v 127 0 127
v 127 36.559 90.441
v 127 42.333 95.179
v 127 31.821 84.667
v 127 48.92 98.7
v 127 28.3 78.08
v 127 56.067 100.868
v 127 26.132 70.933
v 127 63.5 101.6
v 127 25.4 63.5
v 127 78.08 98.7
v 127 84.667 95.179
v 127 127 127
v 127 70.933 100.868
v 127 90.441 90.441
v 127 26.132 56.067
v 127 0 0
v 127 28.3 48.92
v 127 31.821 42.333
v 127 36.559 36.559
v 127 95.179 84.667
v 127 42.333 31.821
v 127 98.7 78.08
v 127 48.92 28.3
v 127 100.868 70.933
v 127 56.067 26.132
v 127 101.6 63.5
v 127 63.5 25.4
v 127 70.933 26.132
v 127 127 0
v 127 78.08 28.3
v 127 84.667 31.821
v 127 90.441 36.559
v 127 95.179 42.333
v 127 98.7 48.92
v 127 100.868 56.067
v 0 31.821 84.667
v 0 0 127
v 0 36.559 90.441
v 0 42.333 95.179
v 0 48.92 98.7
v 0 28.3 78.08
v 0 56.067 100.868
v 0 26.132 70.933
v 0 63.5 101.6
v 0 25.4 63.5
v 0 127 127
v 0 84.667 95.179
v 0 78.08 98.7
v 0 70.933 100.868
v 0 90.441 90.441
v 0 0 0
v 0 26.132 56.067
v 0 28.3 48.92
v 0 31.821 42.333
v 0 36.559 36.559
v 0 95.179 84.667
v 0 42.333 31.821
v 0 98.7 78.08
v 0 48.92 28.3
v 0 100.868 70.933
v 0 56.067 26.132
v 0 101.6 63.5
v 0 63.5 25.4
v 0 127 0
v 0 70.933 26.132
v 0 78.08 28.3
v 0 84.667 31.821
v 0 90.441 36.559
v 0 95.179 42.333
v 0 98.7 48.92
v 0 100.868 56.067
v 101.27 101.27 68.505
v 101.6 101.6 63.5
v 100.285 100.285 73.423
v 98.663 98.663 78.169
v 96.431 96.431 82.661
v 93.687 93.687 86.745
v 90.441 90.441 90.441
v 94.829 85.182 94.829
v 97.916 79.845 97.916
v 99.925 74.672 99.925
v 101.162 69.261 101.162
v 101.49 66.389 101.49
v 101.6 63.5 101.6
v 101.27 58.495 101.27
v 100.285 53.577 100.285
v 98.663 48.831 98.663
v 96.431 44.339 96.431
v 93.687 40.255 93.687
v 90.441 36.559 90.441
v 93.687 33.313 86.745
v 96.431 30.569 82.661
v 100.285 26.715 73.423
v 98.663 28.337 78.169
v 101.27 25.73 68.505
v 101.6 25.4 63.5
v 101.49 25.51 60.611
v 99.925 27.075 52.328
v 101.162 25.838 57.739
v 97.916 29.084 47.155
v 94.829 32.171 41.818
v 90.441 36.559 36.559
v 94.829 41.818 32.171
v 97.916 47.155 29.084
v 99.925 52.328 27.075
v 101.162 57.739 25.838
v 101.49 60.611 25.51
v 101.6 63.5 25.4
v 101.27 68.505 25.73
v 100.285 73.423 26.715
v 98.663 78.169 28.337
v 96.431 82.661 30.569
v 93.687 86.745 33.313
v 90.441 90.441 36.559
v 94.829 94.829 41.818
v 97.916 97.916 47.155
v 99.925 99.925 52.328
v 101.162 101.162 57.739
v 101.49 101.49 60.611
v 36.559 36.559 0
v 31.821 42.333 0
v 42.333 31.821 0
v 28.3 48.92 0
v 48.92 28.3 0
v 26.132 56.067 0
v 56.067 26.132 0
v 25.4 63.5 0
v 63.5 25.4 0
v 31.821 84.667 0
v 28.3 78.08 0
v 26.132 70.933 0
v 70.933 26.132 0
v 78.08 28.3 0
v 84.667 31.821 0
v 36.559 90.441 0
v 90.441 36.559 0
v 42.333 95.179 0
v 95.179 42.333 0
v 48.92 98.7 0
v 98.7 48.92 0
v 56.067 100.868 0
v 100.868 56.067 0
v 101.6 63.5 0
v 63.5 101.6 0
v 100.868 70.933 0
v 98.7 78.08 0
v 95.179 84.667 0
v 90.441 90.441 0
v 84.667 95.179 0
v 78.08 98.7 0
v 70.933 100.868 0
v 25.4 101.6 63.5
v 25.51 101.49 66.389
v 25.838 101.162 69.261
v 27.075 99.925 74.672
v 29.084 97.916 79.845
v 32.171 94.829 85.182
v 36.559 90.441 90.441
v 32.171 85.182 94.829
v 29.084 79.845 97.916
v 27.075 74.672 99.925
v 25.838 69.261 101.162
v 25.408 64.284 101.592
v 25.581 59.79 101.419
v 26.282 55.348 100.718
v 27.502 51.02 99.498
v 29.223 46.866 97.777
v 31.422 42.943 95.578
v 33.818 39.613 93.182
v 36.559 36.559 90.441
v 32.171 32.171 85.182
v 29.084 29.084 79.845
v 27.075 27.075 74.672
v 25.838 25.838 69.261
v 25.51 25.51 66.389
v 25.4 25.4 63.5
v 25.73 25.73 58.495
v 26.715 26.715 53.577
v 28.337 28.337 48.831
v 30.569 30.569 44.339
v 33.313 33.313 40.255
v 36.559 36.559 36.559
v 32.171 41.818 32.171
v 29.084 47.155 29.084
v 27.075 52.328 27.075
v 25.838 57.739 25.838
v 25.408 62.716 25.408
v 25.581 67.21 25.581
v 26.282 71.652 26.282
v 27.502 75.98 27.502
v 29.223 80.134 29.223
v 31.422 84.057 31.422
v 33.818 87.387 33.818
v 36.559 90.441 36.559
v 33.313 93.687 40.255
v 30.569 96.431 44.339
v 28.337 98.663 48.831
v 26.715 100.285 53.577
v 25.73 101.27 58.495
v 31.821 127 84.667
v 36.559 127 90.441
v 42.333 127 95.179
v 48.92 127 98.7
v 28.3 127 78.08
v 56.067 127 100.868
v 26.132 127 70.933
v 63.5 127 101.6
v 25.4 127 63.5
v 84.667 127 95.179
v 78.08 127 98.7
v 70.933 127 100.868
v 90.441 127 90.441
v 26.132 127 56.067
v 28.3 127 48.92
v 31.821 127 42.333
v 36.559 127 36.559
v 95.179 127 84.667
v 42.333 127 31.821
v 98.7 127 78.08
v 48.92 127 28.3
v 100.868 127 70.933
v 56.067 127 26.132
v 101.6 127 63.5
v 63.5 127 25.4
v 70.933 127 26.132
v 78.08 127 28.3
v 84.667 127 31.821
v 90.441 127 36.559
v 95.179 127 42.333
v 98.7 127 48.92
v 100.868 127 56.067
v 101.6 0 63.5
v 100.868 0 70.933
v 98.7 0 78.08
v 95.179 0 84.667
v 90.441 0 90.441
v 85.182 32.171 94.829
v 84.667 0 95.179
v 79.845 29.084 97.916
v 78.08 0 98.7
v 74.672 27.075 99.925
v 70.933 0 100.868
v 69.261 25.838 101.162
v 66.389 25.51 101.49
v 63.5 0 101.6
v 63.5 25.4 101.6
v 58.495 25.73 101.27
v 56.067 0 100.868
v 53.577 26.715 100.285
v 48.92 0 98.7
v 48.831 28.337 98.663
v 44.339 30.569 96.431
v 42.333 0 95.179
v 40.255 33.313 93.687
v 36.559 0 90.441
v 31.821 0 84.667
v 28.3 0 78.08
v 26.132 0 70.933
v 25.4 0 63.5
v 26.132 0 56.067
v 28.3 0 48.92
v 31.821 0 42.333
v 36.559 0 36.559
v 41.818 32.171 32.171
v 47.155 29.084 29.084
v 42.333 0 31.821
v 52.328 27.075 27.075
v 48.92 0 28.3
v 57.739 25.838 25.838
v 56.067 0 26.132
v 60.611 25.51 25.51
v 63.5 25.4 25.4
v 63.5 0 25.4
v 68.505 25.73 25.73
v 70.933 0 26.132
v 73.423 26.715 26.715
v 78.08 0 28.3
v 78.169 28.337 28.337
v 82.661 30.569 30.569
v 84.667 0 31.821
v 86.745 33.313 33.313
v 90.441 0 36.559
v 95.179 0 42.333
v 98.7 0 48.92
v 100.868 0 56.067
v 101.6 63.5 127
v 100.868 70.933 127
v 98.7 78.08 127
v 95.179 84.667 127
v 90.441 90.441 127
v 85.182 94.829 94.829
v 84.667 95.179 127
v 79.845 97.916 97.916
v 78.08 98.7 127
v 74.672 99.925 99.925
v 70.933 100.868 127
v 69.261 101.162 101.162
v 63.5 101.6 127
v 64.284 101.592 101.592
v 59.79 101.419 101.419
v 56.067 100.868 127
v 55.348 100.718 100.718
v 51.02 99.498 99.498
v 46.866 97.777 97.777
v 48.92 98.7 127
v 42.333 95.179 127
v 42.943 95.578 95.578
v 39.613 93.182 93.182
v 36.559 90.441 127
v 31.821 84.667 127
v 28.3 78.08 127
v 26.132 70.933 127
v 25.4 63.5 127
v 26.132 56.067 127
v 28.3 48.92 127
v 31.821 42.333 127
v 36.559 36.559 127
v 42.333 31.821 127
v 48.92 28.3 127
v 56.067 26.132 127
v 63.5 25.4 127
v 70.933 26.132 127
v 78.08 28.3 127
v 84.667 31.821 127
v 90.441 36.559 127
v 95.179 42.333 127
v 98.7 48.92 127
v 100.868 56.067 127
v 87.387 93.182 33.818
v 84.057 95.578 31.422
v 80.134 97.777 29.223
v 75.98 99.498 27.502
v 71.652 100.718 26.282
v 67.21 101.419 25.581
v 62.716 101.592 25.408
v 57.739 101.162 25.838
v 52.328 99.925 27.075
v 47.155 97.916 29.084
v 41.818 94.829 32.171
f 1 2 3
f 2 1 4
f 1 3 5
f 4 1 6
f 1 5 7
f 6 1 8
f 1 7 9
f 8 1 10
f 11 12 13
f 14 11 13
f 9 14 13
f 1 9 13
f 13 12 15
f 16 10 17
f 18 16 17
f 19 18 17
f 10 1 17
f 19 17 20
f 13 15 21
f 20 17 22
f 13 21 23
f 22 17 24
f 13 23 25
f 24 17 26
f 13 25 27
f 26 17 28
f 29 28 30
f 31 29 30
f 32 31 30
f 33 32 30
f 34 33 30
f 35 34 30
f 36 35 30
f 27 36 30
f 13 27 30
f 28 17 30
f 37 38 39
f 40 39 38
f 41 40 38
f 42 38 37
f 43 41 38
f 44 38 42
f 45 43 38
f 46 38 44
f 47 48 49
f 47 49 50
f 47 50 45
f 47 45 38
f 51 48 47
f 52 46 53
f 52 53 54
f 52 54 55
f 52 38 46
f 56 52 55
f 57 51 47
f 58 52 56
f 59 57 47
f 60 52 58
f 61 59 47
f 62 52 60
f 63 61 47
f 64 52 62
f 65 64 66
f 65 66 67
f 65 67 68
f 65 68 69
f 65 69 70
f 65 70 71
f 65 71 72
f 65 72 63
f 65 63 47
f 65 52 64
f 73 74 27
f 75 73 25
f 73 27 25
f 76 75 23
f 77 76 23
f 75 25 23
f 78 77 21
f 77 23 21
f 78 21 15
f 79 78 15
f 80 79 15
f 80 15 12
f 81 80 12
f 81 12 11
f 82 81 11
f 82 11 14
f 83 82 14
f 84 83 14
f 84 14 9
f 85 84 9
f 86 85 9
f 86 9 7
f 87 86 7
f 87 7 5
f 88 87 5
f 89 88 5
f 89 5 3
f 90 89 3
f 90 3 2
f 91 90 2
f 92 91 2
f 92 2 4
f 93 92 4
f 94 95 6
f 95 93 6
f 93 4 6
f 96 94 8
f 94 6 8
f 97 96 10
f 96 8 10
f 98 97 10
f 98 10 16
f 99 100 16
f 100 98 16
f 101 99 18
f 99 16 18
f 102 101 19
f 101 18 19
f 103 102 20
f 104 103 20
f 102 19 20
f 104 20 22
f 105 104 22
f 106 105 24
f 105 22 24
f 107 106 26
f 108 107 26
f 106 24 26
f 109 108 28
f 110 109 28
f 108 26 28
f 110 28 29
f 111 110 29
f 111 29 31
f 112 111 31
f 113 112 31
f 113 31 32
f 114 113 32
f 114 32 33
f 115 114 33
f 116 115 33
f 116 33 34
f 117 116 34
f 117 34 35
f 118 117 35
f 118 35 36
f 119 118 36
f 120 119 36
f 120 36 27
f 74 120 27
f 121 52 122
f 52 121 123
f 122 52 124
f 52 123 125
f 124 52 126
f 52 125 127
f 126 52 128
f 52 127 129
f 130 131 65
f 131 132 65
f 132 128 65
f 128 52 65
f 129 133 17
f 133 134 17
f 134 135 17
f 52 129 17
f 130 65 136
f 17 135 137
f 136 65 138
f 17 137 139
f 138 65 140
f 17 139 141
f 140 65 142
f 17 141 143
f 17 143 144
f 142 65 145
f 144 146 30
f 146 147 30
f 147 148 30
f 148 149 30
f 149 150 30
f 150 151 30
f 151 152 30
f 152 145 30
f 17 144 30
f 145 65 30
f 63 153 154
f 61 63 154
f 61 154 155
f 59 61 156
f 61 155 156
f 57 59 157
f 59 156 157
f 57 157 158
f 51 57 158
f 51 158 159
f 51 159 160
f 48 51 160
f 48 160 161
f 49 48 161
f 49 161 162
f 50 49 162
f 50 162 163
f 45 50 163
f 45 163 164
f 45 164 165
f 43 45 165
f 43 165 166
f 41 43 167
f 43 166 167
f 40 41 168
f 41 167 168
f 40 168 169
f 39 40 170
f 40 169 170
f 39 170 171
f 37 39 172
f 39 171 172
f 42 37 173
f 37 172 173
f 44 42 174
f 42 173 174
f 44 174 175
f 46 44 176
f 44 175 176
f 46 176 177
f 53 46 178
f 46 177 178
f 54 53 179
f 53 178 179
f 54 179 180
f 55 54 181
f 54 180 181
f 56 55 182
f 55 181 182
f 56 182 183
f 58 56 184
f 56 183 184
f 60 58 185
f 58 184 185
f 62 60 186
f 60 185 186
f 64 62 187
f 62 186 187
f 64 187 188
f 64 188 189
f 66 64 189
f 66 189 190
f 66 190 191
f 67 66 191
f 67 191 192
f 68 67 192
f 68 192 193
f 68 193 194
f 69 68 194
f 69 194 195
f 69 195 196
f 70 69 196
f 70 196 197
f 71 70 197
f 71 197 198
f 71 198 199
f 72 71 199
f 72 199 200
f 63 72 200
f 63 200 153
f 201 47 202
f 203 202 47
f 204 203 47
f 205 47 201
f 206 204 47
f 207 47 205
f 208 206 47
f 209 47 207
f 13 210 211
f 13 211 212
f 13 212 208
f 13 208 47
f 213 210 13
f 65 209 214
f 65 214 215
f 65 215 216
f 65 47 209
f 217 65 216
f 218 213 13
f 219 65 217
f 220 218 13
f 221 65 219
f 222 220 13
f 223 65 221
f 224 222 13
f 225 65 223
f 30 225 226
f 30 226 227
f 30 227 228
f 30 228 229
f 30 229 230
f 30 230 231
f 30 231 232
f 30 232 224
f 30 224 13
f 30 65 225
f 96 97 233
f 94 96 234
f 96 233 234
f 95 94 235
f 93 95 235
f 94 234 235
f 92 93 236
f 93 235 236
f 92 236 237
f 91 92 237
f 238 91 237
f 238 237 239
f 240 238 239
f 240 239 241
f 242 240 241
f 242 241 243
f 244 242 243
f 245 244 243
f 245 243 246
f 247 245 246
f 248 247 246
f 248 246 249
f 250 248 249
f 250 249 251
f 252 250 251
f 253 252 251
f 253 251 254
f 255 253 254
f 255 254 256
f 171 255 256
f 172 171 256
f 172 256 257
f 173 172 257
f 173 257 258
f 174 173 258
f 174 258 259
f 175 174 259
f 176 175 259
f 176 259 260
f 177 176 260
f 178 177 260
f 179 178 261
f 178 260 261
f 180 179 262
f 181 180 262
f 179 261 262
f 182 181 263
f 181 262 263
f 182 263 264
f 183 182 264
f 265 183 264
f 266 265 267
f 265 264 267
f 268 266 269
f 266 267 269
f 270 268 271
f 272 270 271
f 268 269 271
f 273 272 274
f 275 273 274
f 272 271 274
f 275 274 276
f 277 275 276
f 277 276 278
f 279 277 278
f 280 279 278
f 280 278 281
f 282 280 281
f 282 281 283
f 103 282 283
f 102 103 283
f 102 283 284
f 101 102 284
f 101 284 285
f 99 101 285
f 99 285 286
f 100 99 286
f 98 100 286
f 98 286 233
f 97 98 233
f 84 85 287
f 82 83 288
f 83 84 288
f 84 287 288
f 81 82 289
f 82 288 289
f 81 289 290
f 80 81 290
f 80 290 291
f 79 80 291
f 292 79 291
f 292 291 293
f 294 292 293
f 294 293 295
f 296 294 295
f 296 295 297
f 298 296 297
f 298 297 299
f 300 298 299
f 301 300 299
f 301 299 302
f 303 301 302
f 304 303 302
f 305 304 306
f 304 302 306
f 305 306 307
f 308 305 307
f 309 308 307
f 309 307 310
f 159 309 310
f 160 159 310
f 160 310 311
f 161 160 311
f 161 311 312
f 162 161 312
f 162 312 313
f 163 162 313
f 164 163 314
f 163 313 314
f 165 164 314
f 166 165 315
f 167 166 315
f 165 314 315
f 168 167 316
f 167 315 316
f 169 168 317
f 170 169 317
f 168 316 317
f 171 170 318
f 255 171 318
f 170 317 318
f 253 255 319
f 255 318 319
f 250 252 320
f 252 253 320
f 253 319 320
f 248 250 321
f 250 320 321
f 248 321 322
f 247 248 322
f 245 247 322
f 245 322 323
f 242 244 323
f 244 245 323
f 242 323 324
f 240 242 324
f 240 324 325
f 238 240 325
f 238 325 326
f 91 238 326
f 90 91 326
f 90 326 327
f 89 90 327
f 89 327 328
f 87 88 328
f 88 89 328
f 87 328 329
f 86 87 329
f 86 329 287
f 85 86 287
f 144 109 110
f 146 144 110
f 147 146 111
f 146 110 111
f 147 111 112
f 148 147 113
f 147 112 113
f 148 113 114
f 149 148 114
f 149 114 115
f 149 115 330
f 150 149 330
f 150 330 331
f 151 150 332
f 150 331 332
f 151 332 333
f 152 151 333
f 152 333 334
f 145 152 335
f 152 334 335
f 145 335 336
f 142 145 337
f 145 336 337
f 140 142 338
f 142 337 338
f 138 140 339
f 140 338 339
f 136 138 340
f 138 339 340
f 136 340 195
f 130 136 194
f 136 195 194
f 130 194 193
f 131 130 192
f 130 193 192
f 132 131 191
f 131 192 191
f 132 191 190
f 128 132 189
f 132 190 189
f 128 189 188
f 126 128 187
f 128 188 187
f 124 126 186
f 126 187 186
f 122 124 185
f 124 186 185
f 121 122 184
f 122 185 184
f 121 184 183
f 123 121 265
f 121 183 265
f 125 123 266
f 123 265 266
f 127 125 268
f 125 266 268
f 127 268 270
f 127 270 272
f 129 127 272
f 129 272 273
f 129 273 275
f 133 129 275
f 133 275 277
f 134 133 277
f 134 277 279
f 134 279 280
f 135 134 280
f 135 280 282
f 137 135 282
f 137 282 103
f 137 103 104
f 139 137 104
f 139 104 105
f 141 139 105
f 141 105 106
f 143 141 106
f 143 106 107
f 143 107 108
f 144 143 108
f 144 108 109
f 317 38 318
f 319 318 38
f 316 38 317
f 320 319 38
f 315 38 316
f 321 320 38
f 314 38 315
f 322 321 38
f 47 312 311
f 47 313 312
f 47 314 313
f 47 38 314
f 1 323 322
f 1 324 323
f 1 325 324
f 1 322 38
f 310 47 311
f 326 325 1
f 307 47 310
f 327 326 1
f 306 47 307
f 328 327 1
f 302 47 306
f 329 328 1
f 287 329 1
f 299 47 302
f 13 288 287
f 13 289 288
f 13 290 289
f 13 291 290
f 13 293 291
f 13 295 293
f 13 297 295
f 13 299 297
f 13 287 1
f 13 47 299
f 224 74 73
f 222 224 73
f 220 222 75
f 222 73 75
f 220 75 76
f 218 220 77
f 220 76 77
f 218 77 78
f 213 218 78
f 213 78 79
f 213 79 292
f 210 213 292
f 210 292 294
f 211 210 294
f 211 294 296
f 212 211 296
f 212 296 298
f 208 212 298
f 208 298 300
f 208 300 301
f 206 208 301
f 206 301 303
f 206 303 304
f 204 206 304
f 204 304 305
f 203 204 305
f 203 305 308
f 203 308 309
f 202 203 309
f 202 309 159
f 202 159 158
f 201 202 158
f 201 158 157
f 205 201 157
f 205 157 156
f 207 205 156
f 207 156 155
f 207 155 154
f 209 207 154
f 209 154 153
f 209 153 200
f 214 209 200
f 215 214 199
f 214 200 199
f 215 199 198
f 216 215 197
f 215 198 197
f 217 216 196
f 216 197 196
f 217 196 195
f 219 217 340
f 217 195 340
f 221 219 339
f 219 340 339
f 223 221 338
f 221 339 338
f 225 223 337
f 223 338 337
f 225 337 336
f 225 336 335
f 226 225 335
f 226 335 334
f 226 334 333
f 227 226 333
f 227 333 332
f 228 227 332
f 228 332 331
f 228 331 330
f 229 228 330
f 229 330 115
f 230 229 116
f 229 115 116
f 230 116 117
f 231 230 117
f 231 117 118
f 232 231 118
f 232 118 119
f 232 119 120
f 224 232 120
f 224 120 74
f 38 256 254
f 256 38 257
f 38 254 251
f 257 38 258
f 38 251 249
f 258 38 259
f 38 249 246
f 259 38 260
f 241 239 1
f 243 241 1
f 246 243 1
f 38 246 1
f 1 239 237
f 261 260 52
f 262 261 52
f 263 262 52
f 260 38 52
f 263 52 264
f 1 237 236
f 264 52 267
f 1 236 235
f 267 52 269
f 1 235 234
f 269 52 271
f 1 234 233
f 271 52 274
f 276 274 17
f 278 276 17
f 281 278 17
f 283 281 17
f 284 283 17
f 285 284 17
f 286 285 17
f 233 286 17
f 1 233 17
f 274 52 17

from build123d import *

# Parameters (mm, degrees)
F0_W     = 127
F0_H     = 127
F1_DEPTH = 127
F2_R     = 38.1
F3_DEPTH = 127.001
F4_R     = 38.1
F5_DEPTH = 127.001
F6_R     = 38.1
F7_DEPTH = 127.001


with BuildPart() as f1:
    # F0 (on Top) → F1 (new body)
    with BuildSketch(Plane.XY):
        with Locations((63.5, 63.5)):
            Rectangle(F0_W, F0_H)
    extrude(amount=F1_DEPTH)

    # F2 (on face) → F3 (cut, through all)
    with BuildSketch(Plane.XZ):
        with Locations((63.5, 63.5)):
            Circle(F2_R)
    extrude(amount=-F3_DEPTH, mode=Mode.SUBTRACT)

    # F4 (on face) → F5 (cut, through all)
    with BuildSketch(Plane.YZ.offset(127)):
        with Locations((63.5, 63.5)):
            Circle(F4_R)
    extrude(amount=-F5_DEPTH, mode=Mode.SUBTRACT)

    # F6 (on face) → F7 (cut, through all)
    with BuildSketch(Plane.XY.offset(127)):
        with Locations((63.5, 63.5)):
            Circle(F6_R)
    extrude(amount=-F7_DEPTH, mode=Mode.SUBTRACT)


solid = f1.part
